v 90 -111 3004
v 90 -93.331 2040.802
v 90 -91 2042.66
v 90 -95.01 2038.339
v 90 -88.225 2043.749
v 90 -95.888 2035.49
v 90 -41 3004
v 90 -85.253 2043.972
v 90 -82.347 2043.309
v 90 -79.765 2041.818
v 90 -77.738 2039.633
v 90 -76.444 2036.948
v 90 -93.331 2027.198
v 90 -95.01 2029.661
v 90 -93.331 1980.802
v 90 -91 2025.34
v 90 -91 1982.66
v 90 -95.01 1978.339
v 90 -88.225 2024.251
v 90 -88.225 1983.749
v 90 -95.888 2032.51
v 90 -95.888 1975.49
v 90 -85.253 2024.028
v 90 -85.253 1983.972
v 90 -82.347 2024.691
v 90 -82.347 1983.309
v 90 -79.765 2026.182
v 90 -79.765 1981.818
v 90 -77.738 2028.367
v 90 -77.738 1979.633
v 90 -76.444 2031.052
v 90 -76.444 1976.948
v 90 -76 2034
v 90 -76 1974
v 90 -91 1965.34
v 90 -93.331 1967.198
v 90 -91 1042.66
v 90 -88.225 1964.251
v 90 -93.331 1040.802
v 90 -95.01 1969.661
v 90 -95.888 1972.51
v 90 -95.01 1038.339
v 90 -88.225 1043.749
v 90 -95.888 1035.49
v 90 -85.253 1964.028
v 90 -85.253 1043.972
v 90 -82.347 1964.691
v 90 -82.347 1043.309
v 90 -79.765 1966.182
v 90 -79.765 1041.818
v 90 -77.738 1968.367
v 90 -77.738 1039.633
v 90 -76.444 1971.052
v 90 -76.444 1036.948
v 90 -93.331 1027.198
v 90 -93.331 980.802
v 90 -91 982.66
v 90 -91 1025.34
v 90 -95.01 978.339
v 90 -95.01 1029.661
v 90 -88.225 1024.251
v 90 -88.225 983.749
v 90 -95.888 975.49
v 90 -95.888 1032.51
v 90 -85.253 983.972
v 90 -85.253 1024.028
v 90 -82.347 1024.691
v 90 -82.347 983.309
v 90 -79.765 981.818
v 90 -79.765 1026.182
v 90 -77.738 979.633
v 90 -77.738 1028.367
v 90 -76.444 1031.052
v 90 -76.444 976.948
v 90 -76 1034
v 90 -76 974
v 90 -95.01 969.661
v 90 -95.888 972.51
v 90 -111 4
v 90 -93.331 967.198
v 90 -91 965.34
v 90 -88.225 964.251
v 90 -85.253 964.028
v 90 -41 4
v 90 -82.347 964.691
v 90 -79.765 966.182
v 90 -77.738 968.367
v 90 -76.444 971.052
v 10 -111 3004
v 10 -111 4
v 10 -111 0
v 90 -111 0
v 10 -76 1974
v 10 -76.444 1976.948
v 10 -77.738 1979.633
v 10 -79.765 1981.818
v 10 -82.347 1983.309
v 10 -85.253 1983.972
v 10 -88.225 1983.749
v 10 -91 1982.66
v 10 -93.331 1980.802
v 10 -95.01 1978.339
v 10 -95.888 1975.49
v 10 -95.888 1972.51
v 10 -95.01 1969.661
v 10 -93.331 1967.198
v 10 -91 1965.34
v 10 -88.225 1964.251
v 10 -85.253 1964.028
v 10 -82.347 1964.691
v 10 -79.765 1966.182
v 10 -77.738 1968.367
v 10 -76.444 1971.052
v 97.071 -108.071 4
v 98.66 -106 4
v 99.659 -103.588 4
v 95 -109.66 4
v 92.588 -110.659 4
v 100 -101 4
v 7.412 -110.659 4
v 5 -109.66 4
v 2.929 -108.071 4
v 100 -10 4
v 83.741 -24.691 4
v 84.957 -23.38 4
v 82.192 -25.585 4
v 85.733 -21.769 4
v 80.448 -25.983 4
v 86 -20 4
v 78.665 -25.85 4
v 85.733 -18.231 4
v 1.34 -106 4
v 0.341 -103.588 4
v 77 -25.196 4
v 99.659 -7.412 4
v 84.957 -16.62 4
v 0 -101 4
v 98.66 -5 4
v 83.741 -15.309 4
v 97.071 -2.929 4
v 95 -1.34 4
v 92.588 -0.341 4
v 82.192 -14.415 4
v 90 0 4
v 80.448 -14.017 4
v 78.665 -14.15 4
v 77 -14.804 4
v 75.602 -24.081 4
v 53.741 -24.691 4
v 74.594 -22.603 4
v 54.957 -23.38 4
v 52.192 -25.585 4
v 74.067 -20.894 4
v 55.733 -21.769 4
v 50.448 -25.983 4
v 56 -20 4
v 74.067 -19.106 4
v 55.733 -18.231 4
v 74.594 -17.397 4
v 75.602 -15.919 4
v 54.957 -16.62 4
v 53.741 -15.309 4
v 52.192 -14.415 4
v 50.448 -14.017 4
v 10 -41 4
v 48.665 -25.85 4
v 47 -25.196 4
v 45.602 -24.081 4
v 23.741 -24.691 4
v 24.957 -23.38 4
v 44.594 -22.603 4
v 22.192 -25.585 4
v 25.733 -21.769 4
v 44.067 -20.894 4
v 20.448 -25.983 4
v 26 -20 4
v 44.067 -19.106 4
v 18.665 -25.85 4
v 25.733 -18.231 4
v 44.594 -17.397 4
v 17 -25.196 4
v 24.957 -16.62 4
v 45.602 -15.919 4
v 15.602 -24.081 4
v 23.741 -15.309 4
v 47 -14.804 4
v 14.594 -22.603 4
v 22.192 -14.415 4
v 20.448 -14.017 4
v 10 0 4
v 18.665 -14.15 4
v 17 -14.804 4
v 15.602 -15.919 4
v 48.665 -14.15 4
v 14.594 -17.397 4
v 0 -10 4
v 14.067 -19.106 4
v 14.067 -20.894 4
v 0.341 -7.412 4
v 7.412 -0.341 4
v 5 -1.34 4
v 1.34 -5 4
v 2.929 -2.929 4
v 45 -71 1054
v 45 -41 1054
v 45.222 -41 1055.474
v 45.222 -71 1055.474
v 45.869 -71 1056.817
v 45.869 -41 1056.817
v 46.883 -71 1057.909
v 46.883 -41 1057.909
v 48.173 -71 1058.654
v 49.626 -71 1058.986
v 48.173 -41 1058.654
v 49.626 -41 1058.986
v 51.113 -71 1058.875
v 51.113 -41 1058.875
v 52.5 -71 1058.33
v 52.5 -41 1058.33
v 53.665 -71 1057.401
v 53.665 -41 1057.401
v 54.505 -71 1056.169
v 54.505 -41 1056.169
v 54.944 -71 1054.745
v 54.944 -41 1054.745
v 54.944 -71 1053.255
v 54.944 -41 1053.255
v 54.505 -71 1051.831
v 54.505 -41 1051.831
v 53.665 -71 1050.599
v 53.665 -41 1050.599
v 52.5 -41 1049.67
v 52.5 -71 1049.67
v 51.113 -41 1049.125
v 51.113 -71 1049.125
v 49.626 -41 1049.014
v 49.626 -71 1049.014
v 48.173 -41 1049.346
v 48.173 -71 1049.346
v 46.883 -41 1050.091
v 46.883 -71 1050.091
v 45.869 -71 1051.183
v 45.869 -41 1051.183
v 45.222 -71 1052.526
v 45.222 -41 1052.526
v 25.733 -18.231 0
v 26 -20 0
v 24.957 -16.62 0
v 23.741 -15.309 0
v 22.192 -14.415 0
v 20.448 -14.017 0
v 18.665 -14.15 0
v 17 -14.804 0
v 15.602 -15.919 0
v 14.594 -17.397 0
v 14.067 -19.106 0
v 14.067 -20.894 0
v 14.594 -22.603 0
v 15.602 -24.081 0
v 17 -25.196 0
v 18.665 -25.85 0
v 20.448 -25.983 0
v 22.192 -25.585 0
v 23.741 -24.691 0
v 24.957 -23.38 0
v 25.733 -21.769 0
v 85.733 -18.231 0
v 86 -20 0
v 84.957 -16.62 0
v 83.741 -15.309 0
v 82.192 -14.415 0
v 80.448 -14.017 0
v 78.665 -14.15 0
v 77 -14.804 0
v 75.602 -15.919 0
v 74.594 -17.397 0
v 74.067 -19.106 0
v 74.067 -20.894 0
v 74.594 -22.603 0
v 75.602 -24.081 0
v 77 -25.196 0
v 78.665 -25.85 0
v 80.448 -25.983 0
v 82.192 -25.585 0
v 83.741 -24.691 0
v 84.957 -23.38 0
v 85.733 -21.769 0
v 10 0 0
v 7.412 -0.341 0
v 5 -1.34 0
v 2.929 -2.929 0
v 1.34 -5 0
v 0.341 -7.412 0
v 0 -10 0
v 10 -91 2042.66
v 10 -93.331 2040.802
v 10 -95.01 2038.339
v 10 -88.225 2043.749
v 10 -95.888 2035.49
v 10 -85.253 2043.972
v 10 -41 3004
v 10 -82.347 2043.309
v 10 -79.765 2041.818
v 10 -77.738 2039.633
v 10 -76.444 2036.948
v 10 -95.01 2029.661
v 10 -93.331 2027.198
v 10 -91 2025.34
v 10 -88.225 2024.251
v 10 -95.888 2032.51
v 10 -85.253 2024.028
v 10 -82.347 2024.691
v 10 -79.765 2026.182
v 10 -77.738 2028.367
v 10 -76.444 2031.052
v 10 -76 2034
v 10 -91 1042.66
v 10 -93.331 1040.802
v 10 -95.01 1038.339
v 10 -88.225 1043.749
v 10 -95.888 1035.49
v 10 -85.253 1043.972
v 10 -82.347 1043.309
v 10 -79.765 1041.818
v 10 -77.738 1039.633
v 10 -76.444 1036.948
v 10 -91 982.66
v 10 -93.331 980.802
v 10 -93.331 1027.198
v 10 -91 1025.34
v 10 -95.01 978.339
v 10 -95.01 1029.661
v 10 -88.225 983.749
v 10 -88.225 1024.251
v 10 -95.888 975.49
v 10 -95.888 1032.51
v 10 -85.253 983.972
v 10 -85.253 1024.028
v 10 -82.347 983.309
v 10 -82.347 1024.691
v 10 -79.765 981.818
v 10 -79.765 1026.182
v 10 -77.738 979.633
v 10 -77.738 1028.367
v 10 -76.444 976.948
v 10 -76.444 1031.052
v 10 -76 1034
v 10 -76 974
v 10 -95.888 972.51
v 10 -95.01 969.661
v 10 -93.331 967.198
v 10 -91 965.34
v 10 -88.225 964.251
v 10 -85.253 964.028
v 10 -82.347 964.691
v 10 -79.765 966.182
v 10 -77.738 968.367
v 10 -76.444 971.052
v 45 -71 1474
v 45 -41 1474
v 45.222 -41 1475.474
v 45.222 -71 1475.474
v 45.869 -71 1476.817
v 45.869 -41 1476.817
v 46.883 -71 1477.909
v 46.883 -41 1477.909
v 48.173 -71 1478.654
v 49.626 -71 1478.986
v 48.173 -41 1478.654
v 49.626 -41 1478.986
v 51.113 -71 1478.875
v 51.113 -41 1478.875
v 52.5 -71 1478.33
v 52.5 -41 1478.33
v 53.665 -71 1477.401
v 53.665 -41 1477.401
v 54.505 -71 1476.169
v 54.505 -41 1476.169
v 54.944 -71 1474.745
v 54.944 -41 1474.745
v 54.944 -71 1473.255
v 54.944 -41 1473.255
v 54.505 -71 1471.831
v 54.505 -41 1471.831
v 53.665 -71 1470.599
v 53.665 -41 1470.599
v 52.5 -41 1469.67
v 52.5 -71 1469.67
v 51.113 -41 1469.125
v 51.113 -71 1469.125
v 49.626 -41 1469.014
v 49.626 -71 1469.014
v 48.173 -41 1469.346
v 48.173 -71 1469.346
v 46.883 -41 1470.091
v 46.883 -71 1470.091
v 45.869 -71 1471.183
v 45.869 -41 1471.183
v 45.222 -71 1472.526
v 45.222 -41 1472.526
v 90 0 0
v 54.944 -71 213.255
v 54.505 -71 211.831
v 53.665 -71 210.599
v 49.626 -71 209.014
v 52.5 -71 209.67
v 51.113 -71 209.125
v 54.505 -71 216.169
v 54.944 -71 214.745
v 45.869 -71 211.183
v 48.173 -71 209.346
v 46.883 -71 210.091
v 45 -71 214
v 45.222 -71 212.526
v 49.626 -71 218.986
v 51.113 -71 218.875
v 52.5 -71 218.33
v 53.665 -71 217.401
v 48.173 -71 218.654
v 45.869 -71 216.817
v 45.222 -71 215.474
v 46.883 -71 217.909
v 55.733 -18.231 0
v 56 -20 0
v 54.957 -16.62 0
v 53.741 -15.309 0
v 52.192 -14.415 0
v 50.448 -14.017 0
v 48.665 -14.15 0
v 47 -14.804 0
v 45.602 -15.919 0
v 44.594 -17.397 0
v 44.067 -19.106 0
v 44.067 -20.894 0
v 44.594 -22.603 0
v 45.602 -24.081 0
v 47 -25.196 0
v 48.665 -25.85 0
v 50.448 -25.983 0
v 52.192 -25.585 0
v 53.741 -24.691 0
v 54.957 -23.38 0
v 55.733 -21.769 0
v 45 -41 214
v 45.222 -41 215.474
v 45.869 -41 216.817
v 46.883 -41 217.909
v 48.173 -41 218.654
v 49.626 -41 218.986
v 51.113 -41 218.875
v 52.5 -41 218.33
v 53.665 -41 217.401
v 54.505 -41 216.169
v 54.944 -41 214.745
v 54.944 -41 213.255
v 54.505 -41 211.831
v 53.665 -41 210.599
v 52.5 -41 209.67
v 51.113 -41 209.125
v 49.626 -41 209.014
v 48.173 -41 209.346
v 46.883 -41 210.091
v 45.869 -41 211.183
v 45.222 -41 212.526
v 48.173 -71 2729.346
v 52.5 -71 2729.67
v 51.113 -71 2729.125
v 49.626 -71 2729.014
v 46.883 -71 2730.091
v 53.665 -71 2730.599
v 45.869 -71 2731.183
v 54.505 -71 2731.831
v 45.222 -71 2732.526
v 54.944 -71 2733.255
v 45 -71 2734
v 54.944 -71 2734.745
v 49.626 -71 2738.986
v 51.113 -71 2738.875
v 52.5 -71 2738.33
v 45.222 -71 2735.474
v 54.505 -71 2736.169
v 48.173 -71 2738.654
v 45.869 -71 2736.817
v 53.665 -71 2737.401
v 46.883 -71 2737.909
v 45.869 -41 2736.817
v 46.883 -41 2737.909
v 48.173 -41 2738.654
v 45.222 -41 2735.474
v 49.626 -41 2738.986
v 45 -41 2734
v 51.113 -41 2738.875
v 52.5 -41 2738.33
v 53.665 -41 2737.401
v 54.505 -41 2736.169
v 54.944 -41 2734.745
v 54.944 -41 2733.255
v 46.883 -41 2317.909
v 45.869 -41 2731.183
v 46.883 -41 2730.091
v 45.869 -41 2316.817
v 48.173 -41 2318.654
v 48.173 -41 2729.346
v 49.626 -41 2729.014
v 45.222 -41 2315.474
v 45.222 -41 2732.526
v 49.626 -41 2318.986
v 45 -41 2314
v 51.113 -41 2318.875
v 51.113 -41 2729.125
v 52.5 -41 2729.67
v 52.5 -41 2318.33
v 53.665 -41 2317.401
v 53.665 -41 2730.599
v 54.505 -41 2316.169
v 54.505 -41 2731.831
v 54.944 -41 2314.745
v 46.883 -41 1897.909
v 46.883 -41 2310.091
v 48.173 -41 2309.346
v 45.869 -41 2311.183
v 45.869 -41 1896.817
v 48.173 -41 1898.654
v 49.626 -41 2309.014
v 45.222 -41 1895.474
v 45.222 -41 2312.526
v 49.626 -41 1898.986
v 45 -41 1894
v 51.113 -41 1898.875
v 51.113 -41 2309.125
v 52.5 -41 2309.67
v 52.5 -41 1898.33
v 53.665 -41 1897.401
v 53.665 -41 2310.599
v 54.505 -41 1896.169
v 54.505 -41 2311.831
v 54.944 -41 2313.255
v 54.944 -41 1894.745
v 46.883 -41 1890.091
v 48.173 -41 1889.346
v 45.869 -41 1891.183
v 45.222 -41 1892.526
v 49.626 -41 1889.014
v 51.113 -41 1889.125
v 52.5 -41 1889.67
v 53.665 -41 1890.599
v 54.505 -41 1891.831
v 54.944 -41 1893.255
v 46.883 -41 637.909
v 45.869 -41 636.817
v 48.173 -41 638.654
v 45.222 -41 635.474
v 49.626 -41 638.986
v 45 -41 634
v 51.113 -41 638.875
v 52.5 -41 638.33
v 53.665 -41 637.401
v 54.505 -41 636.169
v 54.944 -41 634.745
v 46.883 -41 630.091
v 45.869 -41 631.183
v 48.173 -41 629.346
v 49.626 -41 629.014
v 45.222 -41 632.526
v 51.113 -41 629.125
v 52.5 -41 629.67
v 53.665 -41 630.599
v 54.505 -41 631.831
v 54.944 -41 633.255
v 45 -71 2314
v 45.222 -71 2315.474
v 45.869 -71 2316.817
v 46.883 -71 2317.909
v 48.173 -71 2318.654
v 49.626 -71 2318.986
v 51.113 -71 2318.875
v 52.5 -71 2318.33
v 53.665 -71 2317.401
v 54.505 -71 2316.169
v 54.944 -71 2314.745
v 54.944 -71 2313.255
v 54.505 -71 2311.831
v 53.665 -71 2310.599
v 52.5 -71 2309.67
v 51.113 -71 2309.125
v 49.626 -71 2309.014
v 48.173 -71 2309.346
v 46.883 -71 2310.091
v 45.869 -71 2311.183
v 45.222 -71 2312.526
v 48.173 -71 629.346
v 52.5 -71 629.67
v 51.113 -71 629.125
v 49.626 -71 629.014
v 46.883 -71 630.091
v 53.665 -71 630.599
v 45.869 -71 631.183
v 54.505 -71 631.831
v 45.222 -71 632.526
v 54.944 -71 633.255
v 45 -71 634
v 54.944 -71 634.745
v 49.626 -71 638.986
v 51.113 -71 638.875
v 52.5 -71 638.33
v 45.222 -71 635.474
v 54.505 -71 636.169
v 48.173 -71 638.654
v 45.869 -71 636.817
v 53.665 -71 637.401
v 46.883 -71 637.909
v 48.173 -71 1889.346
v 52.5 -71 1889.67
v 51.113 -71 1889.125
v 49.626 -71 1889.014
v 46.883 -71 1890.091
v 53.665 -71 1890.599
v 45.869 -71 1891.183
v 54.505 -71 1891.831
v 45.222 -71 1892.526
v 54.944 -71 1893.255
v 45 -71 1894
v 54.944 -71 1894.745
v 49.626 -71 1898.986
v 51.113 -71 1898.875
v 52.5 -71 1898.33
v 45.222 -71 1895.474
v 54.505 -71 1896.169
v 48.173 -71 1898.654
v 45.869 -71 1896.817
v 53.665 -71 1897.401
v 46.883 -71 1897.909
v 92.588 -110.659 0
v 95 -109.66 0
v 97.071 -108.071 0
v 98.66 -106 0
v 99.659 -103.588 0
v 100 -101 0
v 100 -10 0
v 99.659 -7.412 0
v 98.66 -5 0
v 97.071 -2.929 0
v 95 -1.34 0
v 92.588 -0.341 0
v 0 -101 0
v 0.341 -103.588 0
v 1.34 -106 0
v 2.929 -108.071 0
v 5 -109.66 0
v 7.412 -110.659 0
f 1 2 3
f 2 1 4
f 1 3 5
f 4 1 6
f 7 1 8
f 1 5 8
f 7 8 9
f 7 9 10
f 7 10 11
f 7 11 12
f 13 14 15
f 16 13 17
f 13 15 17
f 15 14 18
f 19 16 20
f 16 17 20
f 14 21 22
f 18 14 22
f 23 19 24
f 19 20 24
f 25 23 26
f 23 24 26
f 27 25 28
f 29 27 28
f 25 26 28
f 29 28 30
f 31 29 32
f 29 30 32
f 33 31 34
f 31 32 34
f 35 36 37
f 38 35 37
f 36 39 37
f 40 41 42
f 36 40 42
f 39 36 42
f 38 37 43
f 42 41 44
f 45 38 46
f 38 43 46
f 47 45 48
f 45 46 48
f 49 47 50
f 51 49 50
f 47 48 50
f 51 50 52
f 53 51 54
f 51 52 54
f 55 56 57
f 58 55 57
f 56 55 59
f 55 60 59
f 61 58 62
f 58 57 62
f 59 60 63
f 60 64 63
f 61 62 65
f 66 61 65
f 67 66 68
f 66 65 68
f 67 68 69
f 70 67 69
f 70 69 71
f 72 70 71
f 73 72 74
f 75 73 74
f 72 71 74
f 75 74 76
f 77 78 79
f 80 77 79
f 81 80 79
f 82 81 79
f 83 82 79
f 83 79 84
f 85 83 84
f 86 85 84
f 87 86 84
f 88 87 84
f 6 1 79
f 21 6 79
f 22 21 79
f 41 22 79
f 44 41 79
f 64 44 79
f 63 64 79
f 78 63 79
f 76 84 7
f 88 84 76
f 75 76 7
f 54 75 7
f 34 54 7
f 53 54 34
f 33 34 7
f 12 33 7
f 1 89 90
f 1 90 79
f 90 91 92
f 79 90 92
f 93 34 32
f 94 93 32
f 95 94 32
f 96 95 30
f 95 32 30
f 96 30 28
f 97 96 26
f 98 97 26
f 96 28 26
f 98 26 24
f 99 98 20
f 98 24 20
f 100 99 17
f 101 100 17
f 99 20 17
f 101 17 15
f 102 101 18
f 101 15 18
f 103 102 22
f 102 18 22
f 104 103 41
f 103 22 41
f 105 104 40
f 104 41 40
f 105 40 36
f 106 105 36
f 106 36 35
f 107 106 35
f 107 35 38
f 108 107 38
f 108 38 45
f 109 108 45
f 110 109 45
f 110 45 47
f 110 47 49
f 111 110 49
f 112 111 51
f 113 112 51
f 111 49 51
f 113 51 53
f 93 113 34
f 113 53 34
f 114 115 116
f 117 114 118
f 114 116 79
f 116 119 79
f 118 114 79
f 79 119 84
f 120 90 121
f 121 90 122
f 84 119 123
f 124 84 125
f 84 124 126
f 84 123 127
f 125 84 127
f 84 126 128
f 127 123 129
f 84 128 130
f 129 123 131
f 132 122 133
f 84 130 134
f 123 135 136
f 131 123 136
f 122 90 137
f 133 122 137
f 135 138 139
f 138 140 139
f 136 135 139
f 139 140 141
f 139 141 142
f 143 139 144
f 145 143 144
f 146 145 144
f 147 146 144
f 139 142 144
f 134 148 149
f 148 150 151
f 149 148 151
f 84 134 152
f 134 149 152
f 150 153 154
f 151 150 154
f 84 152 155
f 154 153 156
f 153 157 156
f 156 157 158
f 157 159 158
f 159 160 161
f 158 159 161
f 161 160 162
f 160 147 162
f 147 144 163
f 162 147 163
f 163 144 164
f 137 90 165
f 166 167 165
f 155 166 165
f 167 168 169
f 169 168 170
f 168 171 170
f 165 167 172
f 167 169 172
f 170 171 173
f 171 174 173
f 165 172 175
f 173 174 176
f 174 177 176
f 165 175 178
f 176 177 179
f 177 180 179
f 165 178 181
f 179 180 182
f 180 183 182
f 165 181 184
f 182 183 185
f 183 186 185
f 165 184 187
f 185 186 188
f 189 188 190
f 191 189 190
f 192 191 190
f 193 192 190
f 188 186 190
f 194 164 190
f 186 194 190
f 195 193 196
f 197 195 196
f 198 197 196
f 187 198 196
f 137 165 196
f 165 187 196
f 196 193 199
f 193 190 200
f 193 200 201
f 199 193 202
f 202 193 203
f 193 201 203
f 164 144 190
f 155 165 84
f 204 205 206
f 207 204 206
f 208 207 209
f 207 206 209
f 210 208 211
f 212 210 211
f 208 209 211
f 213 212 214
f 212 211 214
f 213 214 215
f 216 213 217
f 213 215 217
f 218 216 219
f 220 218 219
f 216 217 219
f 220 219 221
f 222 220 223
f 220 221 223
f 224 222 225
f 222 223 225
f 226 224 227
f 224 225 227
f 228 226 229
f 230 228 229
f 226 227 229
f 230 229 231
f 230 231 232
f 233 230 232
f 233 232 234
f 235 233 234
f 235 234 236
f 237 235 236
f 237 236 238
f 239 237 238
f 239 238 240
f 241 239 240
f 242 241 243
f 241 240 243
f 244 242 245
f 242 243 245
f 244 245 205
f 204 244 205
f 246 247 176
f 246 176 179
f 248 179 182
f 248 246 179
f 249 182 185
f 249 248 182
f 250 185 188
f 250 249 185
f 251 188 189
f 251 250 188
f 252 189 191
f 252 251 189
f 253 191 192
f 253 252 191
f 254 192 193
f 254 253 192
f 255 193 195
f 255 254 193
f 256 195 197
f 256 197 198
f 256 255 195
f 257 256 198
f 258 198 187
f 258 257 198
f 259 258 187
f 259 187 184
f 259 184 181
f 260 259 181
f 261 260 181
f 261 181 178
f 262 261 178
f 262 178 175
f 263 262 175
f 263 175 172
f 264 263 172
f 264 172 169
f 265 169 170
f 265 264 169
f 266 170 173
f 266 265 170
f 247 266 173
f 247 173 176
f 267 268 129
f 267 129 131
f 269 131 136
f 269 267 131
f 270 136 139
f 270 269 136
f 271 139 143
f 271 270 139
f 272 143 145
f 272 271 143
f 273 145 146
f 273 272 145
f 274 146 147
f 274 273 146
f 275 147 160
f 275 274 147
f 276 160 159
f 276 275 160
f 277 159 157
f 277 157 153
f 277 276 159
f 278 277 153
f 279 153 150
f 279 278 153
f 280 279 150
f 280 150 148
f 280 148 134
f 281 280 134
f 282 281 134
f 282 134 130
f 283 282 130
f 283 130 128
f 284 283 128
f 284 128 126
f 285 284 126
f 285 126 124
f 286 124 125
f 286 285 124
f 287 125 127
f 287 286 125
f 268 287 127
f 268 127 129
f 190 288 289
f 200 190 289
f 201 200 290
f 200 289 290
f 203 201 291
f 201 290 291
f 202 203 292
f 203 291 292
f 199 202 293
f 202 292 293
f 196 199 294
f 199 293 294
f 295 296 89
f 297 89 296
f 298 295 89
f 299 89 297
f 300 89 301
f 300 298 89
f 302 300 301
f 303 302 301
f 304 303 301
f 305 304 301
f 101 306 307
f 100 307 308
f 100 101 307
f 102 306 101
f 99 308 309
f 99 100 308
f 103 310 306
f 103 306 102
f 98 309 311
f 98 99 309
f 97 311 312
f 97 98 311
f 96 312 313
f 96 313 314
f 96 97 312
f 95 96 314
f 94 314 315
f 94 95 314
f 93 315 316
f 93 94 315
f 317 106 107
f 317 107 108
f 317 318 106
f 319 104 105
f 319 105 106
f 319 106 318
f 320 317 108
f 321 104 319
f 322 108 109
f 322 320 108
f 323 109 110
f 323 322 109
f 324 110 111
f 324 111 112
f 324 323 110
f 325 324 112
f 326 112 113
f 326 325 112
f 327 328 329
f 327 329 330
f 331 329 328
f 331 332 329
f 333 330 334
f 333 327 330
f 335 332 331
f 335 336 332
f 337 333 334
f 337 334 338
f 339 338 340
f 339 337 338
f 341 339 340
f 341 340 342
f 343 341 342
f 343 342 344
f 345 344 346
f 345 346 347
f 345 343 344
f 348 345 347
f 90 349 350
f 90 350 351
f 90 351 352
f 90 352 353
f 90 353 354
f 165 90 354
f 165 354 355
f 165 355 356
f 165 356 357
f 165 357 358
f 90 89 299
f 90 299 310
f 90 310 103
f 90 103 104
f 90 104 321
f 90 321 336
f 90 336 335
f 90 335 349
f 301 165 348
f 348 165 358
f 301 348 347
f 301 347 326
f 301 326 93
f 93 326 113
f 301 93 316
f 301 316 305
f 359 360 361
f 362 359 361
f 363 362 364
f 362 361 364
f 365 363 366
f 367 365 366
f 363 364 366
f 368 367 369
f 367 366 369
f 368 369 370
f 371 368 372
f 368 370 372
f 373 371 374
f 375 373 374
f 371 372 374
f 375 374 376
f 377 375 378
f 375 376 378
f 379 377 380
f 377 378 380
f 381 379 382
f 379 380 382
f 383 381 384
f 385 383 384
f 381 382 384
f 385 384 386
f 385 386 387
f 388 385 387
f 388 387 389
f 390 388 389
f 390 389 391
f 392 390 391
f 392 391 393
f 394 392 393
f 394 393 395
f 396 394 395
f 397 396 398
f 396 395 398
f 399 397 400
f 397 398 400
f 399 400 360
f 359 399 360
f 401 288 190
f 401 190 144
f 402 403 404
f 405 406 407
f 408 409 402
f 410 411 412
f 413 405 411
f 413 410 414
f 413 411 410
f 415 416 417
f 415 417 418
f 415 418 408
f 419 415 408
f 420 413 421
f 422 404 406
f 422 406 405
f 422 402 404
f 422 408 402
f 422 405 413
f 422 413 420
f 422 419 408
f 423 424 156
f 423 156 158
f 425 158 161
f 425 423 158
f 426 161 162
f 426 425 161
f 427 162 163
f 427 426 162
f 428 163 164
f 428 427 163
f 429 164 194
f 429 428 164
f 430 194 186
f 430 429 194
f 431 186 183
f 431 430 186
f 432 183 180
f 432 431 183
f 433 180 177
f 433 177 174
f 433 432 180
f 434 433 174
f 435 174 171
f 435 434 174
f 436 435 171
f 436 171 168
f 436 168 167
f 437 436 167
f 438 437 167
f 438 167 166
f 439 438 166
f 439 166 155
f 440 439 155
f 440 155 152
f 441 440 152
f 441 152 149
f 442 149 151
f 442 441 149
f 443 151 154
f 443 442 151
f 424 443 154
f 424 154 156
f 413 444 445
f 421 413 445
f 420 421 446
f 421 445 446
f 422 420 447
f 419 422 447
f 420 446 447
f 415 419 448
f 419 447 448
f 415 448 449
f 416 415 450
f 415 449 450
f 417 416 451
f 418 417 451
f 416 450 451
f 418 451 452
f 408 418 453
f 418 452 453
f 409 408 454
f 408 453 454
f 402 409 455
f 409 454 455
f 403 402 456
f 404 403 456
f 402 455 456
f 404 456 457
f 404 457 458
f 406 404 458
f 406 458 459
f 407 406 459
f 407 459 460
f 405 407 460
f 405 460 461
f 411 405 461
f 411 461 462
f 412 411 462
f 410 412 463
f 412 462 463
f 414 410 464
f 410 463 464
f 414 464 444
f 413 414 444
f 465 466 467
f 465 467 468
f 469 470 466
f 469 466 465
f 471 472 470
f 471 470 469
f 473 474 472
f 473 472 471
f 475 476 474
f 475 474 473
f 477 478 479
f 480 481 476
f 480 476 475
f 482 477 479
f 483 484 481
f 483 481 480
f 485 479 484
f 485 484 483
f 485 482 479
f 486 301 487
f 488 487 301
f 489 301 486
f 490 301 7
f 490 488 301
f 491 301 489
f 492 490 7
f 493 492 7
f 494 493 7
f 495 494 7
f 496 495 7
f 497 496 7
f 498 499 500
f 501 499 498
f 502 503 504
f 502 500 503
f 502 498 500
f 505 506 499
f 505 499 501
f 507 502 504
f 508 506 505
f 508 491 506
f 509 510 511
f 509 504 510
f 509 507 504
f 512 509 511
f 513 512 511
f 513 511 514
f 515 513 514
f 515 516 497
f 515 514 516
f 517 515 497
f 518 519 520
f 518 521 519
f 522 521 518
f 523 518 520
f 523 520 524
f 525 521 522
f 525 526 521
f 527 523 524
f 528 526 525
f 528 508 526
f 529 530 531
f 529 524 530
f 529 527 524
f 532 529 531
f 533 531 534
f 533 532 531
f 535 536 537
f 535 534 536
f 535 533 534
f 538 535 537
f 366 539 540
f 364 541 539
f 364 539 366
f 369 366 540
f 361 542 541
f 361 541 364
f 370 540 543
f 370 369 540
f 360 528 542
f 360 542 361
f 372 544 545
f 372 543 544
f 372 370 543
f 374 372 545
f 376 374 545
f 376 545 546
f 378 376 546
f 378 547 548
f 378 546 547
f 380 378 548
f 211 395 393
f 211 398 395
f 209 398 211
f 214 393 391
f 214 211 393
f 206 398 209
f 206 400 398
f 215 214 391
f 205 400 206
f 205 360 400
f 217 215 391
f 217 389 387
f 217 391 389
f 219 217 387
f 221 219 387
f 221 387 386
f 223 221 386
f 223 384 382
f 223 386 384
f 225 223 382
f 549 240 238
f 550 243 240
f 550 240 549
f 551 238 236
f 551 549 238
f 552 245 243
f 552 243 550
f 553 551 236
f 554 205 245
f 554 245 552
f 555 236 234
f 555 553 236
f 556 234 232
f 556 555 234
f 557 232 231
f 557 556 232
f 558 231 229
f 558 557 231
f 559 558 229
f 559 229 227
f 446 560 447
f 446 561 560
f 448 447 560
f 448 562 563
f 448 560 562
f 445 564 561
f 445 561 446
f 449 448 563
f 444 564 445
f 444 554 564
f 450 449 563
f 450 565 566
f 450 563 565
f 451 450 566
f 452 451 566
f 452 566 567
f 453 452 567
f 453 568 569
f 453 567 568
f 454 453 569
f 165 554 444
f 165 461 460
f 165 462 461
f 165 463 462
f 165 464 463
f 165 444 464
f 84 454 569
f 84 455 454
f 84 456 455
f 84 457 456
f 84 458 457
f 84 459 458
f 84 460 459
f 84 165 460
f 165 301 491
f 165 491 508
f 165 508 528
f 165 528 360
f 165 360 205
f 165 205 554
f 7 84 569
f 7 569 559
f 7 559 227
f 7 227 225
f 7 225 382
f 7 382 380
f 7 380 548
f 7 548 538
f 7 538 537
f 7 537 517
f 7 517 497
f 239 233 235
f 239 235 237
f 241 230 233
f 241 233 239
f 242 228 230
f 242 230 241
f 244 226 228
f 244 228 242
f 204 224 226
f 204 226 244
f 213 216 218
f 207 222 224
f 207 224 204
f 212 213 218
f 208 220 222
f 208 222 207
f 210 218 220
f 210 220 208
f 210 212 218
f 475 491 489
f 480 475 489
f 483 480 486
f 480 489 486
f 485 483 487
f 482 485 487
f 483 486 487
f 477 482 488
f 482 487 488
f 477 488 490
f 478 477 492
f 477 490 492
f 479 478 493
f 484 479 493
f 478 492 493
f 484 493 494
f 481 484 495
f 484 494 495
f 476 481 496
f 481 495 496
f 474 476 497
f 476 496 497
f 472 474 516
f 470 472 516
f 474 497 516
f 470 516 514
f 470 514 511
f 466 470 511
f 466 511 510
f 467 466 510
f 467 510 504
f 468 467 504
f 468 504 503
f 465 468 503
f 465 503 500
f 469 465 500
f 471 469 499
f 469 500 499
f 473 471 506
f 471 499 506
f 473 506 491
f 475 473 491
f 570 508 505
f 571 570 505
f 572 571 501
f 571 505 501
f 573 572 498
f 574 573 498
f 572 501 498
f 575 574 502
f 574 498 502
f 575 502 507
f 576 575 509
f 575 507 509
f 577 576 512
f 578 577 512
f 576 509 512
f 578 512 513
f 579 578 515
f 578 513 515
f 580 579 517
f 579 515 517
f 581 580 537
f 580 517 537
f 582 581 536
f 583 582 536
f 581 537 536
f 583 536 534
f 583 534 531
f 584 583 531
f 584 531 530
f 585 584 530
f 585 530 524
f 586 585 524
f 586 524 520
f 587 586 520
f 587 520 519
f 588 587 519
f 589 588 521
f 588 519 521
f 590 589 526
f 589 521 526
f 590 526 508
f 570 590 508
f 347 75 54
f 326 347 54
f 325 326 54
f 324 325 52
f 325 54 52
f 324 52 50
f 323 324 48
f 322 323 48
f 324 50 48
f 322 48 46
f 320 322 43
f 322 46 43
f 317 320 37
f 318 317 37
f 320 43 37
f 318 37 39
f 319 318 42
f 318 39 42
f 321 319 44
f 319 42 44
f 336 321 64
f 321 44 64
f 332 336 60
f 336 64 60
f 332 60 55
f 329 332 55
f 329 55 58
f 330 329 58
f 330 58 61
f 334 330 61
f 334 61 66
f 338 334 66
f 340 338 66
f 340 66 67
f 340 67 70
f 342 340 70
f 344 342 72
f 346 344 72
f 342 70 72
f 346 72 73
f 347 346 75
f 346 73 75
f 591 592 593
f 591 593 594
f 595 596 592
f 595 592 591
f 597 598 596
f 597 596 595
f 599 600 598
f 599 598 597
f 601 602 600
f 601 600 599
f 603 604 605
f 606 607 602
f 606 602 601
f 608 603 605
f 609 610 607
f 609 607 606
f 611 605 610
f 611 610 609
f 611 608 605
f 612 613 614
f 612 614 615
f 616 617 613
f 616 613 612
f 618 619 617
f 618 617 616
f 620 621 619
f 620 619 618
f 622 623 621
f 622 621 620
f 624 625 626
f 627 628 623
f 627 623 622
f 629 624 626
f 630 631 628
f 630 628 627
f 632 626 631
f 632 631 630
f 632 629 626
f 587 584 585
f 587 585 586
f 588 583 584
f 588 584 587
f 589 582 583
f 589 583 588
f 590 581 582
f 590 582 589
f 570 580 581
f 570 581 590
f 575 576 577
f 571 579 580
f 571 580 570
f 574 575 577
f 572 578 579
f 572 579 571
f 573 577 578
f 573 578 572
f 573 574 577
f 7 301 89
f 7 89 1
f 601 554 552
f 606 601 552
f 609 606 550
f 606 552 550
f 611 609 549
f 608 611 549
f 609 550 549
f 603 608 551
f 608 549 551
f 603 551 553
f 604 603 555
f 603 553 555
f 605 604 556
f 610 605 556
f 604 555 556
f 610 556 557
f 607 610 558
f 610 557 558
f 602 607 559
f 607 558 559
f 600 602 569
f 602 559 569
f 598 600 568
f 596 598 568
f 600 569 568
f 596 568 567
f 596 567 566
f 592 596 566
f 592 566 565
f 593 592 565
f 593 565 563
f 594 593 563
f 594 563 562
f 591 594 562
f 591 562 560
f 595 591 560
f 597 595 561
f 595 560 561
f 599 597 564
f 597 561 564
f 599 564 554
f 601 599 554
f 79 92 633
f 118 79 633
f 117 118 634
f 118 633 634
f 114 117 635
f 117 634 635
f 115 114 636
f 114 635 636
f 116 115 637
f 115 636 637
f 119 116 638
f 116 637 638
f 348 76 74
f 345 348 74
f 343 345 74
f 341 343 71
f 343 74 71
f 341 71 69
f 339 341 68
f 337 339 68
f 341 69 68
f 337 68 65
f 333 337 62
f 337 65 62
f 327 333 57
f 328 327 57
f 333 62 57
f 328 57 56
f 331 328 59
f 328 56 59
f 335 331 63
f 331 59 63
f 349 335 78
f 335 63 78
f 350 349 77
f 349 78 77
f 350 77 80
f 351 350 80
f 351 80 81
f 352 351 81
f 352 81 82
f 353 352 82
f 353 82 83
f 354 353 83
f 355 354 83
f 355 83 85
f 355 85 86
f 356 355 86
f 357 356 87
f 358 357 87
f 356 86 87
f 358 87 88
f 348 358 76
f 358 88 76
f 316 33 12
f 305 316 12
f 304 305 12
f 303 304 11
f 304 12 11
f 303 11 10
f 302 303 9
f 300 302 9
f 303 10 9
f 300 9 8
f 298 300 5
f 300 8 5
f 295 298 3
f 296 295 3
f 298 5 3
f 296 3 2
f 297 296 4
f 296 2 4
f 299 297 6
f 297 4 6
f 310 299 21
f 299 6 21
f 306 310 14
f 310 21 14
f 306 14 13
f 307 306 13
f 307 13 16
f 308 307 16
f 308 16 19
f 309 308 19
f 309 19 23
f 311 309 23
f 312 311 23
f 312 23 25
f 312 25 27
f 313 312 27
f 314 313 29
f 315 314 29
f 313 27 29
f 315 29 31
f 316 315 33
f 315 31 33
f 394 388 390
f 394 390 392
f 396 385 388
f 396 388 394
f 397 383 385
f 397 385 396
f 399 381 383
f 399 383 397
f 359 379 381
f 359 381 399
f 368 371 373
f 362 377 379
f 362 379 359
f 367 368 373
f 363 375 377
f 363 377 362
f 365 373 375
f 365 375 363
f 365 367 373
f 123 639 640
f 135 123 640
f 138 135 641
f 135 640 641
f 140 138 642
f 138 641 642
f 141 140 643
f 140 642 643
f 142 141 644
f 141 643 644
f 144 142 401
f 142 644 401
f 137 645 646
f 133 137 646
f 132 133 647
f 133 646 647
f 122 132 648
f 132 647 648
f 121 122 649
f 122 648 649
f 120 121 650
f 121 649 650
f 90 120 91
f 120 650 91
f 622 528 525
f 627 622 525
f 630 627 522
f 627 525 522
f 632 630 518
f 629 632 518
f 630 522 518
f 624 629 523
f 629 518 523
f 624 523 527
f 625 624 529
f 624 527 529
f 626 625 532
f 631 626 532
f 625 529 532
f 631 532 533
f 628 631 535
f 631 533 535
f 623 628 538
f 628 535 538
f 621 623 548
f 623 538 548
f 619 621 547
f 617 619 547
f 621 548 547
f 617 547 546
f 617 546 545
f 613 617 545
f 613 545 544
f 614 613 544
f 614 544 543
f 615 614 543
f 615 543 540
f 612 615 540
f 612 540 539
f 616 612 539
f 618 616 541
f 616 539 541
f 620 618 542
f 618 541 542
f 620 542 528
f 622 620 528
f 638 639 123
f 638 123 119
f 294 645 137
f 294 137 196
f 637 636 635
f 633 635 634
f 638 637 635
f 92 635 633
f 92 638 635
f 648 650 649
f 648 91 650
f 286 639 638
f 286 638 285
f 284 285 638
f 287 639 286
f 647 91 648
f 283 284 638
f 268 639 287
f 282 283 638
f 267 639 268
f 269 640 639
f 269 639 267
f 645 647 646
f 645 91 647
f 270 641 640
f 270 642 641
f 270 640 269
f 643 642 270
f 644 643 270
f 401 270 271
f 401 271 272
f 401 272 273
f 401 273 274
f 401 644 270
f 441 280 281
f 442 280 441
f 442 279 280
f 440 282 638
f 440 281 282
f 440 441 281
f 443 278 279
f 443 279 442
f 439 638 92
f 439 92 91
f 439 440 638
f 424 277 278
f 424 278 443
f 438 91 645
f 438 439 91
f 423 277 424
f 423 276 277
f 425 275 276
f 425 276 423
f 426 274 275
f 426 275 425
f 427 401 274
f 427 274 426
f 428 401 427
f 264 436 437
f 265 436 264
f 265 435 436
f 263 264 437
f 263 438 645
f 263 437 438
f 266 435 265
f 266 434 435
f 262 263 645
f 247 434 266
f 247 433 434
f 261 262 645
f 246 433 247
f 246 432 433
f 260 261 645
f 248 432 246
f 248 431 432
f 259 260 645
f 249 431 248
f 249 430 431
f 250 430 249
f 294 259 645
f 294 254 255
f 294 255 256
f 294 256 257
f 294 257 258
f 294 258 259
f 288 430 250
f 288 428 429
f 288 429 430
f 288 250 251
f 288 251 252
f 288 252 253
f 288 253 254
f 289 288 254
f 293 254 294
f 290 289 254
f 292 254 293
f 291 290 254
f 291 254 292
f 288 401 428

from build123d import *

# Parameters (mm, degrees)
SKETCH_R        = 6
PAD_DEPTH       = 4
SKETCH001_W     = 80
SKETCH001_H     = 70
PAD001_DEPTH    = 3000
SKETCH002_R     = 10
POCKET_DEPTH    = 80
SKETCH004_R     = 5
POCKET001_DEPTH = 30


with BuildPart() as part:
    # Sketch → Pad (new body)
    with BuildSketch(Plane.XY):
        with BuildLine():
            Line((10, 0), (90, 0))
            ThreePointArc((100, -10), (97.071068, -2.928932), (90, 0))
            Line((100, -10), (100, -101))
            ThreePointArc((90, -111), (97.071068, -108.071068), (100, -101))
            Line((90, -111), (10, -111))
            ThreePointArc((0, -101), (2.928932, -108.071068), (10, -111))
            Line((0, -101), (0, -10))
            ThreePointArc((10, 0), (2.928932, -2.928932), (0, -10))
        make_face()
        with Locations((20, -20)):
            Circle(SKETCH_R, mode=Mode.SUBTRACT)
        with Locations((50, -20)):
            Circle(SKETCH_R, mode=Mode.SUBTRACT)
        with Locations((80, -20)):
            Circle(SKETCH_R, mode=Mode.SUBTRACT)
    extrude(amount=PAD_DEPTH)

    # Sketch001 (on Face13 of Pad) → Pad001 (join)
    with BuildSketch(Plane.XY.offset(4)):
        with Locations((50, -76)):
            Rectangle(SKETCH001_W, SKETCH001_H)
    extrude(amount=PAD001_DEPTH)

    # Sketch002 (on Face14 of Pad001) → Pocket (cut)
    with BuildSketch(Plane.YZ.offset(90)):
        with Locations((-86, 1034)):
            Circle(SKETCH002_R)
        with Locations((-86, 974)):
            Circle(SKETCH002_R)
        with Locations((-86, 2034)):
            Circle(SKETCH002_R)
        with Locations((-86, 1974)):
            Circle(SKETCH002_R)
    extrude(amount=-POCKET_DEPTH, mode=Mode.SUBTRACT)

    # Sketch004 (on Face15 of Pocket) → Pocket001 (cut)
    with BuildSketch(Plane(origin=(0, -41, 0), x_dir=(-1, 0, 0), z_dir=(0, 1, 0))):
        with Locations((-50, 214)):
            Circle(SKETCH004_R)
        with Locations((-50, 634)):
            Circle(SKETCH004_R)
        with Locations((-50, 1054)):
            Circle(SKETCH004_R)
        with Locations((-50, 1474)):
            Circle(SKETCH004_R)
        with Locations((-50, 1894)):
            Circle(SKETCH004_R)
        with Locations((-50, 2314)):
            Circle(SKETCH004_R)
        with Locations((-50, 2734)):
            Circle(SKETCH004_R)
    extrude(amount=-POCKET001_DEPTH, mode=Mode.SUBTRACT)


solid = part.part
